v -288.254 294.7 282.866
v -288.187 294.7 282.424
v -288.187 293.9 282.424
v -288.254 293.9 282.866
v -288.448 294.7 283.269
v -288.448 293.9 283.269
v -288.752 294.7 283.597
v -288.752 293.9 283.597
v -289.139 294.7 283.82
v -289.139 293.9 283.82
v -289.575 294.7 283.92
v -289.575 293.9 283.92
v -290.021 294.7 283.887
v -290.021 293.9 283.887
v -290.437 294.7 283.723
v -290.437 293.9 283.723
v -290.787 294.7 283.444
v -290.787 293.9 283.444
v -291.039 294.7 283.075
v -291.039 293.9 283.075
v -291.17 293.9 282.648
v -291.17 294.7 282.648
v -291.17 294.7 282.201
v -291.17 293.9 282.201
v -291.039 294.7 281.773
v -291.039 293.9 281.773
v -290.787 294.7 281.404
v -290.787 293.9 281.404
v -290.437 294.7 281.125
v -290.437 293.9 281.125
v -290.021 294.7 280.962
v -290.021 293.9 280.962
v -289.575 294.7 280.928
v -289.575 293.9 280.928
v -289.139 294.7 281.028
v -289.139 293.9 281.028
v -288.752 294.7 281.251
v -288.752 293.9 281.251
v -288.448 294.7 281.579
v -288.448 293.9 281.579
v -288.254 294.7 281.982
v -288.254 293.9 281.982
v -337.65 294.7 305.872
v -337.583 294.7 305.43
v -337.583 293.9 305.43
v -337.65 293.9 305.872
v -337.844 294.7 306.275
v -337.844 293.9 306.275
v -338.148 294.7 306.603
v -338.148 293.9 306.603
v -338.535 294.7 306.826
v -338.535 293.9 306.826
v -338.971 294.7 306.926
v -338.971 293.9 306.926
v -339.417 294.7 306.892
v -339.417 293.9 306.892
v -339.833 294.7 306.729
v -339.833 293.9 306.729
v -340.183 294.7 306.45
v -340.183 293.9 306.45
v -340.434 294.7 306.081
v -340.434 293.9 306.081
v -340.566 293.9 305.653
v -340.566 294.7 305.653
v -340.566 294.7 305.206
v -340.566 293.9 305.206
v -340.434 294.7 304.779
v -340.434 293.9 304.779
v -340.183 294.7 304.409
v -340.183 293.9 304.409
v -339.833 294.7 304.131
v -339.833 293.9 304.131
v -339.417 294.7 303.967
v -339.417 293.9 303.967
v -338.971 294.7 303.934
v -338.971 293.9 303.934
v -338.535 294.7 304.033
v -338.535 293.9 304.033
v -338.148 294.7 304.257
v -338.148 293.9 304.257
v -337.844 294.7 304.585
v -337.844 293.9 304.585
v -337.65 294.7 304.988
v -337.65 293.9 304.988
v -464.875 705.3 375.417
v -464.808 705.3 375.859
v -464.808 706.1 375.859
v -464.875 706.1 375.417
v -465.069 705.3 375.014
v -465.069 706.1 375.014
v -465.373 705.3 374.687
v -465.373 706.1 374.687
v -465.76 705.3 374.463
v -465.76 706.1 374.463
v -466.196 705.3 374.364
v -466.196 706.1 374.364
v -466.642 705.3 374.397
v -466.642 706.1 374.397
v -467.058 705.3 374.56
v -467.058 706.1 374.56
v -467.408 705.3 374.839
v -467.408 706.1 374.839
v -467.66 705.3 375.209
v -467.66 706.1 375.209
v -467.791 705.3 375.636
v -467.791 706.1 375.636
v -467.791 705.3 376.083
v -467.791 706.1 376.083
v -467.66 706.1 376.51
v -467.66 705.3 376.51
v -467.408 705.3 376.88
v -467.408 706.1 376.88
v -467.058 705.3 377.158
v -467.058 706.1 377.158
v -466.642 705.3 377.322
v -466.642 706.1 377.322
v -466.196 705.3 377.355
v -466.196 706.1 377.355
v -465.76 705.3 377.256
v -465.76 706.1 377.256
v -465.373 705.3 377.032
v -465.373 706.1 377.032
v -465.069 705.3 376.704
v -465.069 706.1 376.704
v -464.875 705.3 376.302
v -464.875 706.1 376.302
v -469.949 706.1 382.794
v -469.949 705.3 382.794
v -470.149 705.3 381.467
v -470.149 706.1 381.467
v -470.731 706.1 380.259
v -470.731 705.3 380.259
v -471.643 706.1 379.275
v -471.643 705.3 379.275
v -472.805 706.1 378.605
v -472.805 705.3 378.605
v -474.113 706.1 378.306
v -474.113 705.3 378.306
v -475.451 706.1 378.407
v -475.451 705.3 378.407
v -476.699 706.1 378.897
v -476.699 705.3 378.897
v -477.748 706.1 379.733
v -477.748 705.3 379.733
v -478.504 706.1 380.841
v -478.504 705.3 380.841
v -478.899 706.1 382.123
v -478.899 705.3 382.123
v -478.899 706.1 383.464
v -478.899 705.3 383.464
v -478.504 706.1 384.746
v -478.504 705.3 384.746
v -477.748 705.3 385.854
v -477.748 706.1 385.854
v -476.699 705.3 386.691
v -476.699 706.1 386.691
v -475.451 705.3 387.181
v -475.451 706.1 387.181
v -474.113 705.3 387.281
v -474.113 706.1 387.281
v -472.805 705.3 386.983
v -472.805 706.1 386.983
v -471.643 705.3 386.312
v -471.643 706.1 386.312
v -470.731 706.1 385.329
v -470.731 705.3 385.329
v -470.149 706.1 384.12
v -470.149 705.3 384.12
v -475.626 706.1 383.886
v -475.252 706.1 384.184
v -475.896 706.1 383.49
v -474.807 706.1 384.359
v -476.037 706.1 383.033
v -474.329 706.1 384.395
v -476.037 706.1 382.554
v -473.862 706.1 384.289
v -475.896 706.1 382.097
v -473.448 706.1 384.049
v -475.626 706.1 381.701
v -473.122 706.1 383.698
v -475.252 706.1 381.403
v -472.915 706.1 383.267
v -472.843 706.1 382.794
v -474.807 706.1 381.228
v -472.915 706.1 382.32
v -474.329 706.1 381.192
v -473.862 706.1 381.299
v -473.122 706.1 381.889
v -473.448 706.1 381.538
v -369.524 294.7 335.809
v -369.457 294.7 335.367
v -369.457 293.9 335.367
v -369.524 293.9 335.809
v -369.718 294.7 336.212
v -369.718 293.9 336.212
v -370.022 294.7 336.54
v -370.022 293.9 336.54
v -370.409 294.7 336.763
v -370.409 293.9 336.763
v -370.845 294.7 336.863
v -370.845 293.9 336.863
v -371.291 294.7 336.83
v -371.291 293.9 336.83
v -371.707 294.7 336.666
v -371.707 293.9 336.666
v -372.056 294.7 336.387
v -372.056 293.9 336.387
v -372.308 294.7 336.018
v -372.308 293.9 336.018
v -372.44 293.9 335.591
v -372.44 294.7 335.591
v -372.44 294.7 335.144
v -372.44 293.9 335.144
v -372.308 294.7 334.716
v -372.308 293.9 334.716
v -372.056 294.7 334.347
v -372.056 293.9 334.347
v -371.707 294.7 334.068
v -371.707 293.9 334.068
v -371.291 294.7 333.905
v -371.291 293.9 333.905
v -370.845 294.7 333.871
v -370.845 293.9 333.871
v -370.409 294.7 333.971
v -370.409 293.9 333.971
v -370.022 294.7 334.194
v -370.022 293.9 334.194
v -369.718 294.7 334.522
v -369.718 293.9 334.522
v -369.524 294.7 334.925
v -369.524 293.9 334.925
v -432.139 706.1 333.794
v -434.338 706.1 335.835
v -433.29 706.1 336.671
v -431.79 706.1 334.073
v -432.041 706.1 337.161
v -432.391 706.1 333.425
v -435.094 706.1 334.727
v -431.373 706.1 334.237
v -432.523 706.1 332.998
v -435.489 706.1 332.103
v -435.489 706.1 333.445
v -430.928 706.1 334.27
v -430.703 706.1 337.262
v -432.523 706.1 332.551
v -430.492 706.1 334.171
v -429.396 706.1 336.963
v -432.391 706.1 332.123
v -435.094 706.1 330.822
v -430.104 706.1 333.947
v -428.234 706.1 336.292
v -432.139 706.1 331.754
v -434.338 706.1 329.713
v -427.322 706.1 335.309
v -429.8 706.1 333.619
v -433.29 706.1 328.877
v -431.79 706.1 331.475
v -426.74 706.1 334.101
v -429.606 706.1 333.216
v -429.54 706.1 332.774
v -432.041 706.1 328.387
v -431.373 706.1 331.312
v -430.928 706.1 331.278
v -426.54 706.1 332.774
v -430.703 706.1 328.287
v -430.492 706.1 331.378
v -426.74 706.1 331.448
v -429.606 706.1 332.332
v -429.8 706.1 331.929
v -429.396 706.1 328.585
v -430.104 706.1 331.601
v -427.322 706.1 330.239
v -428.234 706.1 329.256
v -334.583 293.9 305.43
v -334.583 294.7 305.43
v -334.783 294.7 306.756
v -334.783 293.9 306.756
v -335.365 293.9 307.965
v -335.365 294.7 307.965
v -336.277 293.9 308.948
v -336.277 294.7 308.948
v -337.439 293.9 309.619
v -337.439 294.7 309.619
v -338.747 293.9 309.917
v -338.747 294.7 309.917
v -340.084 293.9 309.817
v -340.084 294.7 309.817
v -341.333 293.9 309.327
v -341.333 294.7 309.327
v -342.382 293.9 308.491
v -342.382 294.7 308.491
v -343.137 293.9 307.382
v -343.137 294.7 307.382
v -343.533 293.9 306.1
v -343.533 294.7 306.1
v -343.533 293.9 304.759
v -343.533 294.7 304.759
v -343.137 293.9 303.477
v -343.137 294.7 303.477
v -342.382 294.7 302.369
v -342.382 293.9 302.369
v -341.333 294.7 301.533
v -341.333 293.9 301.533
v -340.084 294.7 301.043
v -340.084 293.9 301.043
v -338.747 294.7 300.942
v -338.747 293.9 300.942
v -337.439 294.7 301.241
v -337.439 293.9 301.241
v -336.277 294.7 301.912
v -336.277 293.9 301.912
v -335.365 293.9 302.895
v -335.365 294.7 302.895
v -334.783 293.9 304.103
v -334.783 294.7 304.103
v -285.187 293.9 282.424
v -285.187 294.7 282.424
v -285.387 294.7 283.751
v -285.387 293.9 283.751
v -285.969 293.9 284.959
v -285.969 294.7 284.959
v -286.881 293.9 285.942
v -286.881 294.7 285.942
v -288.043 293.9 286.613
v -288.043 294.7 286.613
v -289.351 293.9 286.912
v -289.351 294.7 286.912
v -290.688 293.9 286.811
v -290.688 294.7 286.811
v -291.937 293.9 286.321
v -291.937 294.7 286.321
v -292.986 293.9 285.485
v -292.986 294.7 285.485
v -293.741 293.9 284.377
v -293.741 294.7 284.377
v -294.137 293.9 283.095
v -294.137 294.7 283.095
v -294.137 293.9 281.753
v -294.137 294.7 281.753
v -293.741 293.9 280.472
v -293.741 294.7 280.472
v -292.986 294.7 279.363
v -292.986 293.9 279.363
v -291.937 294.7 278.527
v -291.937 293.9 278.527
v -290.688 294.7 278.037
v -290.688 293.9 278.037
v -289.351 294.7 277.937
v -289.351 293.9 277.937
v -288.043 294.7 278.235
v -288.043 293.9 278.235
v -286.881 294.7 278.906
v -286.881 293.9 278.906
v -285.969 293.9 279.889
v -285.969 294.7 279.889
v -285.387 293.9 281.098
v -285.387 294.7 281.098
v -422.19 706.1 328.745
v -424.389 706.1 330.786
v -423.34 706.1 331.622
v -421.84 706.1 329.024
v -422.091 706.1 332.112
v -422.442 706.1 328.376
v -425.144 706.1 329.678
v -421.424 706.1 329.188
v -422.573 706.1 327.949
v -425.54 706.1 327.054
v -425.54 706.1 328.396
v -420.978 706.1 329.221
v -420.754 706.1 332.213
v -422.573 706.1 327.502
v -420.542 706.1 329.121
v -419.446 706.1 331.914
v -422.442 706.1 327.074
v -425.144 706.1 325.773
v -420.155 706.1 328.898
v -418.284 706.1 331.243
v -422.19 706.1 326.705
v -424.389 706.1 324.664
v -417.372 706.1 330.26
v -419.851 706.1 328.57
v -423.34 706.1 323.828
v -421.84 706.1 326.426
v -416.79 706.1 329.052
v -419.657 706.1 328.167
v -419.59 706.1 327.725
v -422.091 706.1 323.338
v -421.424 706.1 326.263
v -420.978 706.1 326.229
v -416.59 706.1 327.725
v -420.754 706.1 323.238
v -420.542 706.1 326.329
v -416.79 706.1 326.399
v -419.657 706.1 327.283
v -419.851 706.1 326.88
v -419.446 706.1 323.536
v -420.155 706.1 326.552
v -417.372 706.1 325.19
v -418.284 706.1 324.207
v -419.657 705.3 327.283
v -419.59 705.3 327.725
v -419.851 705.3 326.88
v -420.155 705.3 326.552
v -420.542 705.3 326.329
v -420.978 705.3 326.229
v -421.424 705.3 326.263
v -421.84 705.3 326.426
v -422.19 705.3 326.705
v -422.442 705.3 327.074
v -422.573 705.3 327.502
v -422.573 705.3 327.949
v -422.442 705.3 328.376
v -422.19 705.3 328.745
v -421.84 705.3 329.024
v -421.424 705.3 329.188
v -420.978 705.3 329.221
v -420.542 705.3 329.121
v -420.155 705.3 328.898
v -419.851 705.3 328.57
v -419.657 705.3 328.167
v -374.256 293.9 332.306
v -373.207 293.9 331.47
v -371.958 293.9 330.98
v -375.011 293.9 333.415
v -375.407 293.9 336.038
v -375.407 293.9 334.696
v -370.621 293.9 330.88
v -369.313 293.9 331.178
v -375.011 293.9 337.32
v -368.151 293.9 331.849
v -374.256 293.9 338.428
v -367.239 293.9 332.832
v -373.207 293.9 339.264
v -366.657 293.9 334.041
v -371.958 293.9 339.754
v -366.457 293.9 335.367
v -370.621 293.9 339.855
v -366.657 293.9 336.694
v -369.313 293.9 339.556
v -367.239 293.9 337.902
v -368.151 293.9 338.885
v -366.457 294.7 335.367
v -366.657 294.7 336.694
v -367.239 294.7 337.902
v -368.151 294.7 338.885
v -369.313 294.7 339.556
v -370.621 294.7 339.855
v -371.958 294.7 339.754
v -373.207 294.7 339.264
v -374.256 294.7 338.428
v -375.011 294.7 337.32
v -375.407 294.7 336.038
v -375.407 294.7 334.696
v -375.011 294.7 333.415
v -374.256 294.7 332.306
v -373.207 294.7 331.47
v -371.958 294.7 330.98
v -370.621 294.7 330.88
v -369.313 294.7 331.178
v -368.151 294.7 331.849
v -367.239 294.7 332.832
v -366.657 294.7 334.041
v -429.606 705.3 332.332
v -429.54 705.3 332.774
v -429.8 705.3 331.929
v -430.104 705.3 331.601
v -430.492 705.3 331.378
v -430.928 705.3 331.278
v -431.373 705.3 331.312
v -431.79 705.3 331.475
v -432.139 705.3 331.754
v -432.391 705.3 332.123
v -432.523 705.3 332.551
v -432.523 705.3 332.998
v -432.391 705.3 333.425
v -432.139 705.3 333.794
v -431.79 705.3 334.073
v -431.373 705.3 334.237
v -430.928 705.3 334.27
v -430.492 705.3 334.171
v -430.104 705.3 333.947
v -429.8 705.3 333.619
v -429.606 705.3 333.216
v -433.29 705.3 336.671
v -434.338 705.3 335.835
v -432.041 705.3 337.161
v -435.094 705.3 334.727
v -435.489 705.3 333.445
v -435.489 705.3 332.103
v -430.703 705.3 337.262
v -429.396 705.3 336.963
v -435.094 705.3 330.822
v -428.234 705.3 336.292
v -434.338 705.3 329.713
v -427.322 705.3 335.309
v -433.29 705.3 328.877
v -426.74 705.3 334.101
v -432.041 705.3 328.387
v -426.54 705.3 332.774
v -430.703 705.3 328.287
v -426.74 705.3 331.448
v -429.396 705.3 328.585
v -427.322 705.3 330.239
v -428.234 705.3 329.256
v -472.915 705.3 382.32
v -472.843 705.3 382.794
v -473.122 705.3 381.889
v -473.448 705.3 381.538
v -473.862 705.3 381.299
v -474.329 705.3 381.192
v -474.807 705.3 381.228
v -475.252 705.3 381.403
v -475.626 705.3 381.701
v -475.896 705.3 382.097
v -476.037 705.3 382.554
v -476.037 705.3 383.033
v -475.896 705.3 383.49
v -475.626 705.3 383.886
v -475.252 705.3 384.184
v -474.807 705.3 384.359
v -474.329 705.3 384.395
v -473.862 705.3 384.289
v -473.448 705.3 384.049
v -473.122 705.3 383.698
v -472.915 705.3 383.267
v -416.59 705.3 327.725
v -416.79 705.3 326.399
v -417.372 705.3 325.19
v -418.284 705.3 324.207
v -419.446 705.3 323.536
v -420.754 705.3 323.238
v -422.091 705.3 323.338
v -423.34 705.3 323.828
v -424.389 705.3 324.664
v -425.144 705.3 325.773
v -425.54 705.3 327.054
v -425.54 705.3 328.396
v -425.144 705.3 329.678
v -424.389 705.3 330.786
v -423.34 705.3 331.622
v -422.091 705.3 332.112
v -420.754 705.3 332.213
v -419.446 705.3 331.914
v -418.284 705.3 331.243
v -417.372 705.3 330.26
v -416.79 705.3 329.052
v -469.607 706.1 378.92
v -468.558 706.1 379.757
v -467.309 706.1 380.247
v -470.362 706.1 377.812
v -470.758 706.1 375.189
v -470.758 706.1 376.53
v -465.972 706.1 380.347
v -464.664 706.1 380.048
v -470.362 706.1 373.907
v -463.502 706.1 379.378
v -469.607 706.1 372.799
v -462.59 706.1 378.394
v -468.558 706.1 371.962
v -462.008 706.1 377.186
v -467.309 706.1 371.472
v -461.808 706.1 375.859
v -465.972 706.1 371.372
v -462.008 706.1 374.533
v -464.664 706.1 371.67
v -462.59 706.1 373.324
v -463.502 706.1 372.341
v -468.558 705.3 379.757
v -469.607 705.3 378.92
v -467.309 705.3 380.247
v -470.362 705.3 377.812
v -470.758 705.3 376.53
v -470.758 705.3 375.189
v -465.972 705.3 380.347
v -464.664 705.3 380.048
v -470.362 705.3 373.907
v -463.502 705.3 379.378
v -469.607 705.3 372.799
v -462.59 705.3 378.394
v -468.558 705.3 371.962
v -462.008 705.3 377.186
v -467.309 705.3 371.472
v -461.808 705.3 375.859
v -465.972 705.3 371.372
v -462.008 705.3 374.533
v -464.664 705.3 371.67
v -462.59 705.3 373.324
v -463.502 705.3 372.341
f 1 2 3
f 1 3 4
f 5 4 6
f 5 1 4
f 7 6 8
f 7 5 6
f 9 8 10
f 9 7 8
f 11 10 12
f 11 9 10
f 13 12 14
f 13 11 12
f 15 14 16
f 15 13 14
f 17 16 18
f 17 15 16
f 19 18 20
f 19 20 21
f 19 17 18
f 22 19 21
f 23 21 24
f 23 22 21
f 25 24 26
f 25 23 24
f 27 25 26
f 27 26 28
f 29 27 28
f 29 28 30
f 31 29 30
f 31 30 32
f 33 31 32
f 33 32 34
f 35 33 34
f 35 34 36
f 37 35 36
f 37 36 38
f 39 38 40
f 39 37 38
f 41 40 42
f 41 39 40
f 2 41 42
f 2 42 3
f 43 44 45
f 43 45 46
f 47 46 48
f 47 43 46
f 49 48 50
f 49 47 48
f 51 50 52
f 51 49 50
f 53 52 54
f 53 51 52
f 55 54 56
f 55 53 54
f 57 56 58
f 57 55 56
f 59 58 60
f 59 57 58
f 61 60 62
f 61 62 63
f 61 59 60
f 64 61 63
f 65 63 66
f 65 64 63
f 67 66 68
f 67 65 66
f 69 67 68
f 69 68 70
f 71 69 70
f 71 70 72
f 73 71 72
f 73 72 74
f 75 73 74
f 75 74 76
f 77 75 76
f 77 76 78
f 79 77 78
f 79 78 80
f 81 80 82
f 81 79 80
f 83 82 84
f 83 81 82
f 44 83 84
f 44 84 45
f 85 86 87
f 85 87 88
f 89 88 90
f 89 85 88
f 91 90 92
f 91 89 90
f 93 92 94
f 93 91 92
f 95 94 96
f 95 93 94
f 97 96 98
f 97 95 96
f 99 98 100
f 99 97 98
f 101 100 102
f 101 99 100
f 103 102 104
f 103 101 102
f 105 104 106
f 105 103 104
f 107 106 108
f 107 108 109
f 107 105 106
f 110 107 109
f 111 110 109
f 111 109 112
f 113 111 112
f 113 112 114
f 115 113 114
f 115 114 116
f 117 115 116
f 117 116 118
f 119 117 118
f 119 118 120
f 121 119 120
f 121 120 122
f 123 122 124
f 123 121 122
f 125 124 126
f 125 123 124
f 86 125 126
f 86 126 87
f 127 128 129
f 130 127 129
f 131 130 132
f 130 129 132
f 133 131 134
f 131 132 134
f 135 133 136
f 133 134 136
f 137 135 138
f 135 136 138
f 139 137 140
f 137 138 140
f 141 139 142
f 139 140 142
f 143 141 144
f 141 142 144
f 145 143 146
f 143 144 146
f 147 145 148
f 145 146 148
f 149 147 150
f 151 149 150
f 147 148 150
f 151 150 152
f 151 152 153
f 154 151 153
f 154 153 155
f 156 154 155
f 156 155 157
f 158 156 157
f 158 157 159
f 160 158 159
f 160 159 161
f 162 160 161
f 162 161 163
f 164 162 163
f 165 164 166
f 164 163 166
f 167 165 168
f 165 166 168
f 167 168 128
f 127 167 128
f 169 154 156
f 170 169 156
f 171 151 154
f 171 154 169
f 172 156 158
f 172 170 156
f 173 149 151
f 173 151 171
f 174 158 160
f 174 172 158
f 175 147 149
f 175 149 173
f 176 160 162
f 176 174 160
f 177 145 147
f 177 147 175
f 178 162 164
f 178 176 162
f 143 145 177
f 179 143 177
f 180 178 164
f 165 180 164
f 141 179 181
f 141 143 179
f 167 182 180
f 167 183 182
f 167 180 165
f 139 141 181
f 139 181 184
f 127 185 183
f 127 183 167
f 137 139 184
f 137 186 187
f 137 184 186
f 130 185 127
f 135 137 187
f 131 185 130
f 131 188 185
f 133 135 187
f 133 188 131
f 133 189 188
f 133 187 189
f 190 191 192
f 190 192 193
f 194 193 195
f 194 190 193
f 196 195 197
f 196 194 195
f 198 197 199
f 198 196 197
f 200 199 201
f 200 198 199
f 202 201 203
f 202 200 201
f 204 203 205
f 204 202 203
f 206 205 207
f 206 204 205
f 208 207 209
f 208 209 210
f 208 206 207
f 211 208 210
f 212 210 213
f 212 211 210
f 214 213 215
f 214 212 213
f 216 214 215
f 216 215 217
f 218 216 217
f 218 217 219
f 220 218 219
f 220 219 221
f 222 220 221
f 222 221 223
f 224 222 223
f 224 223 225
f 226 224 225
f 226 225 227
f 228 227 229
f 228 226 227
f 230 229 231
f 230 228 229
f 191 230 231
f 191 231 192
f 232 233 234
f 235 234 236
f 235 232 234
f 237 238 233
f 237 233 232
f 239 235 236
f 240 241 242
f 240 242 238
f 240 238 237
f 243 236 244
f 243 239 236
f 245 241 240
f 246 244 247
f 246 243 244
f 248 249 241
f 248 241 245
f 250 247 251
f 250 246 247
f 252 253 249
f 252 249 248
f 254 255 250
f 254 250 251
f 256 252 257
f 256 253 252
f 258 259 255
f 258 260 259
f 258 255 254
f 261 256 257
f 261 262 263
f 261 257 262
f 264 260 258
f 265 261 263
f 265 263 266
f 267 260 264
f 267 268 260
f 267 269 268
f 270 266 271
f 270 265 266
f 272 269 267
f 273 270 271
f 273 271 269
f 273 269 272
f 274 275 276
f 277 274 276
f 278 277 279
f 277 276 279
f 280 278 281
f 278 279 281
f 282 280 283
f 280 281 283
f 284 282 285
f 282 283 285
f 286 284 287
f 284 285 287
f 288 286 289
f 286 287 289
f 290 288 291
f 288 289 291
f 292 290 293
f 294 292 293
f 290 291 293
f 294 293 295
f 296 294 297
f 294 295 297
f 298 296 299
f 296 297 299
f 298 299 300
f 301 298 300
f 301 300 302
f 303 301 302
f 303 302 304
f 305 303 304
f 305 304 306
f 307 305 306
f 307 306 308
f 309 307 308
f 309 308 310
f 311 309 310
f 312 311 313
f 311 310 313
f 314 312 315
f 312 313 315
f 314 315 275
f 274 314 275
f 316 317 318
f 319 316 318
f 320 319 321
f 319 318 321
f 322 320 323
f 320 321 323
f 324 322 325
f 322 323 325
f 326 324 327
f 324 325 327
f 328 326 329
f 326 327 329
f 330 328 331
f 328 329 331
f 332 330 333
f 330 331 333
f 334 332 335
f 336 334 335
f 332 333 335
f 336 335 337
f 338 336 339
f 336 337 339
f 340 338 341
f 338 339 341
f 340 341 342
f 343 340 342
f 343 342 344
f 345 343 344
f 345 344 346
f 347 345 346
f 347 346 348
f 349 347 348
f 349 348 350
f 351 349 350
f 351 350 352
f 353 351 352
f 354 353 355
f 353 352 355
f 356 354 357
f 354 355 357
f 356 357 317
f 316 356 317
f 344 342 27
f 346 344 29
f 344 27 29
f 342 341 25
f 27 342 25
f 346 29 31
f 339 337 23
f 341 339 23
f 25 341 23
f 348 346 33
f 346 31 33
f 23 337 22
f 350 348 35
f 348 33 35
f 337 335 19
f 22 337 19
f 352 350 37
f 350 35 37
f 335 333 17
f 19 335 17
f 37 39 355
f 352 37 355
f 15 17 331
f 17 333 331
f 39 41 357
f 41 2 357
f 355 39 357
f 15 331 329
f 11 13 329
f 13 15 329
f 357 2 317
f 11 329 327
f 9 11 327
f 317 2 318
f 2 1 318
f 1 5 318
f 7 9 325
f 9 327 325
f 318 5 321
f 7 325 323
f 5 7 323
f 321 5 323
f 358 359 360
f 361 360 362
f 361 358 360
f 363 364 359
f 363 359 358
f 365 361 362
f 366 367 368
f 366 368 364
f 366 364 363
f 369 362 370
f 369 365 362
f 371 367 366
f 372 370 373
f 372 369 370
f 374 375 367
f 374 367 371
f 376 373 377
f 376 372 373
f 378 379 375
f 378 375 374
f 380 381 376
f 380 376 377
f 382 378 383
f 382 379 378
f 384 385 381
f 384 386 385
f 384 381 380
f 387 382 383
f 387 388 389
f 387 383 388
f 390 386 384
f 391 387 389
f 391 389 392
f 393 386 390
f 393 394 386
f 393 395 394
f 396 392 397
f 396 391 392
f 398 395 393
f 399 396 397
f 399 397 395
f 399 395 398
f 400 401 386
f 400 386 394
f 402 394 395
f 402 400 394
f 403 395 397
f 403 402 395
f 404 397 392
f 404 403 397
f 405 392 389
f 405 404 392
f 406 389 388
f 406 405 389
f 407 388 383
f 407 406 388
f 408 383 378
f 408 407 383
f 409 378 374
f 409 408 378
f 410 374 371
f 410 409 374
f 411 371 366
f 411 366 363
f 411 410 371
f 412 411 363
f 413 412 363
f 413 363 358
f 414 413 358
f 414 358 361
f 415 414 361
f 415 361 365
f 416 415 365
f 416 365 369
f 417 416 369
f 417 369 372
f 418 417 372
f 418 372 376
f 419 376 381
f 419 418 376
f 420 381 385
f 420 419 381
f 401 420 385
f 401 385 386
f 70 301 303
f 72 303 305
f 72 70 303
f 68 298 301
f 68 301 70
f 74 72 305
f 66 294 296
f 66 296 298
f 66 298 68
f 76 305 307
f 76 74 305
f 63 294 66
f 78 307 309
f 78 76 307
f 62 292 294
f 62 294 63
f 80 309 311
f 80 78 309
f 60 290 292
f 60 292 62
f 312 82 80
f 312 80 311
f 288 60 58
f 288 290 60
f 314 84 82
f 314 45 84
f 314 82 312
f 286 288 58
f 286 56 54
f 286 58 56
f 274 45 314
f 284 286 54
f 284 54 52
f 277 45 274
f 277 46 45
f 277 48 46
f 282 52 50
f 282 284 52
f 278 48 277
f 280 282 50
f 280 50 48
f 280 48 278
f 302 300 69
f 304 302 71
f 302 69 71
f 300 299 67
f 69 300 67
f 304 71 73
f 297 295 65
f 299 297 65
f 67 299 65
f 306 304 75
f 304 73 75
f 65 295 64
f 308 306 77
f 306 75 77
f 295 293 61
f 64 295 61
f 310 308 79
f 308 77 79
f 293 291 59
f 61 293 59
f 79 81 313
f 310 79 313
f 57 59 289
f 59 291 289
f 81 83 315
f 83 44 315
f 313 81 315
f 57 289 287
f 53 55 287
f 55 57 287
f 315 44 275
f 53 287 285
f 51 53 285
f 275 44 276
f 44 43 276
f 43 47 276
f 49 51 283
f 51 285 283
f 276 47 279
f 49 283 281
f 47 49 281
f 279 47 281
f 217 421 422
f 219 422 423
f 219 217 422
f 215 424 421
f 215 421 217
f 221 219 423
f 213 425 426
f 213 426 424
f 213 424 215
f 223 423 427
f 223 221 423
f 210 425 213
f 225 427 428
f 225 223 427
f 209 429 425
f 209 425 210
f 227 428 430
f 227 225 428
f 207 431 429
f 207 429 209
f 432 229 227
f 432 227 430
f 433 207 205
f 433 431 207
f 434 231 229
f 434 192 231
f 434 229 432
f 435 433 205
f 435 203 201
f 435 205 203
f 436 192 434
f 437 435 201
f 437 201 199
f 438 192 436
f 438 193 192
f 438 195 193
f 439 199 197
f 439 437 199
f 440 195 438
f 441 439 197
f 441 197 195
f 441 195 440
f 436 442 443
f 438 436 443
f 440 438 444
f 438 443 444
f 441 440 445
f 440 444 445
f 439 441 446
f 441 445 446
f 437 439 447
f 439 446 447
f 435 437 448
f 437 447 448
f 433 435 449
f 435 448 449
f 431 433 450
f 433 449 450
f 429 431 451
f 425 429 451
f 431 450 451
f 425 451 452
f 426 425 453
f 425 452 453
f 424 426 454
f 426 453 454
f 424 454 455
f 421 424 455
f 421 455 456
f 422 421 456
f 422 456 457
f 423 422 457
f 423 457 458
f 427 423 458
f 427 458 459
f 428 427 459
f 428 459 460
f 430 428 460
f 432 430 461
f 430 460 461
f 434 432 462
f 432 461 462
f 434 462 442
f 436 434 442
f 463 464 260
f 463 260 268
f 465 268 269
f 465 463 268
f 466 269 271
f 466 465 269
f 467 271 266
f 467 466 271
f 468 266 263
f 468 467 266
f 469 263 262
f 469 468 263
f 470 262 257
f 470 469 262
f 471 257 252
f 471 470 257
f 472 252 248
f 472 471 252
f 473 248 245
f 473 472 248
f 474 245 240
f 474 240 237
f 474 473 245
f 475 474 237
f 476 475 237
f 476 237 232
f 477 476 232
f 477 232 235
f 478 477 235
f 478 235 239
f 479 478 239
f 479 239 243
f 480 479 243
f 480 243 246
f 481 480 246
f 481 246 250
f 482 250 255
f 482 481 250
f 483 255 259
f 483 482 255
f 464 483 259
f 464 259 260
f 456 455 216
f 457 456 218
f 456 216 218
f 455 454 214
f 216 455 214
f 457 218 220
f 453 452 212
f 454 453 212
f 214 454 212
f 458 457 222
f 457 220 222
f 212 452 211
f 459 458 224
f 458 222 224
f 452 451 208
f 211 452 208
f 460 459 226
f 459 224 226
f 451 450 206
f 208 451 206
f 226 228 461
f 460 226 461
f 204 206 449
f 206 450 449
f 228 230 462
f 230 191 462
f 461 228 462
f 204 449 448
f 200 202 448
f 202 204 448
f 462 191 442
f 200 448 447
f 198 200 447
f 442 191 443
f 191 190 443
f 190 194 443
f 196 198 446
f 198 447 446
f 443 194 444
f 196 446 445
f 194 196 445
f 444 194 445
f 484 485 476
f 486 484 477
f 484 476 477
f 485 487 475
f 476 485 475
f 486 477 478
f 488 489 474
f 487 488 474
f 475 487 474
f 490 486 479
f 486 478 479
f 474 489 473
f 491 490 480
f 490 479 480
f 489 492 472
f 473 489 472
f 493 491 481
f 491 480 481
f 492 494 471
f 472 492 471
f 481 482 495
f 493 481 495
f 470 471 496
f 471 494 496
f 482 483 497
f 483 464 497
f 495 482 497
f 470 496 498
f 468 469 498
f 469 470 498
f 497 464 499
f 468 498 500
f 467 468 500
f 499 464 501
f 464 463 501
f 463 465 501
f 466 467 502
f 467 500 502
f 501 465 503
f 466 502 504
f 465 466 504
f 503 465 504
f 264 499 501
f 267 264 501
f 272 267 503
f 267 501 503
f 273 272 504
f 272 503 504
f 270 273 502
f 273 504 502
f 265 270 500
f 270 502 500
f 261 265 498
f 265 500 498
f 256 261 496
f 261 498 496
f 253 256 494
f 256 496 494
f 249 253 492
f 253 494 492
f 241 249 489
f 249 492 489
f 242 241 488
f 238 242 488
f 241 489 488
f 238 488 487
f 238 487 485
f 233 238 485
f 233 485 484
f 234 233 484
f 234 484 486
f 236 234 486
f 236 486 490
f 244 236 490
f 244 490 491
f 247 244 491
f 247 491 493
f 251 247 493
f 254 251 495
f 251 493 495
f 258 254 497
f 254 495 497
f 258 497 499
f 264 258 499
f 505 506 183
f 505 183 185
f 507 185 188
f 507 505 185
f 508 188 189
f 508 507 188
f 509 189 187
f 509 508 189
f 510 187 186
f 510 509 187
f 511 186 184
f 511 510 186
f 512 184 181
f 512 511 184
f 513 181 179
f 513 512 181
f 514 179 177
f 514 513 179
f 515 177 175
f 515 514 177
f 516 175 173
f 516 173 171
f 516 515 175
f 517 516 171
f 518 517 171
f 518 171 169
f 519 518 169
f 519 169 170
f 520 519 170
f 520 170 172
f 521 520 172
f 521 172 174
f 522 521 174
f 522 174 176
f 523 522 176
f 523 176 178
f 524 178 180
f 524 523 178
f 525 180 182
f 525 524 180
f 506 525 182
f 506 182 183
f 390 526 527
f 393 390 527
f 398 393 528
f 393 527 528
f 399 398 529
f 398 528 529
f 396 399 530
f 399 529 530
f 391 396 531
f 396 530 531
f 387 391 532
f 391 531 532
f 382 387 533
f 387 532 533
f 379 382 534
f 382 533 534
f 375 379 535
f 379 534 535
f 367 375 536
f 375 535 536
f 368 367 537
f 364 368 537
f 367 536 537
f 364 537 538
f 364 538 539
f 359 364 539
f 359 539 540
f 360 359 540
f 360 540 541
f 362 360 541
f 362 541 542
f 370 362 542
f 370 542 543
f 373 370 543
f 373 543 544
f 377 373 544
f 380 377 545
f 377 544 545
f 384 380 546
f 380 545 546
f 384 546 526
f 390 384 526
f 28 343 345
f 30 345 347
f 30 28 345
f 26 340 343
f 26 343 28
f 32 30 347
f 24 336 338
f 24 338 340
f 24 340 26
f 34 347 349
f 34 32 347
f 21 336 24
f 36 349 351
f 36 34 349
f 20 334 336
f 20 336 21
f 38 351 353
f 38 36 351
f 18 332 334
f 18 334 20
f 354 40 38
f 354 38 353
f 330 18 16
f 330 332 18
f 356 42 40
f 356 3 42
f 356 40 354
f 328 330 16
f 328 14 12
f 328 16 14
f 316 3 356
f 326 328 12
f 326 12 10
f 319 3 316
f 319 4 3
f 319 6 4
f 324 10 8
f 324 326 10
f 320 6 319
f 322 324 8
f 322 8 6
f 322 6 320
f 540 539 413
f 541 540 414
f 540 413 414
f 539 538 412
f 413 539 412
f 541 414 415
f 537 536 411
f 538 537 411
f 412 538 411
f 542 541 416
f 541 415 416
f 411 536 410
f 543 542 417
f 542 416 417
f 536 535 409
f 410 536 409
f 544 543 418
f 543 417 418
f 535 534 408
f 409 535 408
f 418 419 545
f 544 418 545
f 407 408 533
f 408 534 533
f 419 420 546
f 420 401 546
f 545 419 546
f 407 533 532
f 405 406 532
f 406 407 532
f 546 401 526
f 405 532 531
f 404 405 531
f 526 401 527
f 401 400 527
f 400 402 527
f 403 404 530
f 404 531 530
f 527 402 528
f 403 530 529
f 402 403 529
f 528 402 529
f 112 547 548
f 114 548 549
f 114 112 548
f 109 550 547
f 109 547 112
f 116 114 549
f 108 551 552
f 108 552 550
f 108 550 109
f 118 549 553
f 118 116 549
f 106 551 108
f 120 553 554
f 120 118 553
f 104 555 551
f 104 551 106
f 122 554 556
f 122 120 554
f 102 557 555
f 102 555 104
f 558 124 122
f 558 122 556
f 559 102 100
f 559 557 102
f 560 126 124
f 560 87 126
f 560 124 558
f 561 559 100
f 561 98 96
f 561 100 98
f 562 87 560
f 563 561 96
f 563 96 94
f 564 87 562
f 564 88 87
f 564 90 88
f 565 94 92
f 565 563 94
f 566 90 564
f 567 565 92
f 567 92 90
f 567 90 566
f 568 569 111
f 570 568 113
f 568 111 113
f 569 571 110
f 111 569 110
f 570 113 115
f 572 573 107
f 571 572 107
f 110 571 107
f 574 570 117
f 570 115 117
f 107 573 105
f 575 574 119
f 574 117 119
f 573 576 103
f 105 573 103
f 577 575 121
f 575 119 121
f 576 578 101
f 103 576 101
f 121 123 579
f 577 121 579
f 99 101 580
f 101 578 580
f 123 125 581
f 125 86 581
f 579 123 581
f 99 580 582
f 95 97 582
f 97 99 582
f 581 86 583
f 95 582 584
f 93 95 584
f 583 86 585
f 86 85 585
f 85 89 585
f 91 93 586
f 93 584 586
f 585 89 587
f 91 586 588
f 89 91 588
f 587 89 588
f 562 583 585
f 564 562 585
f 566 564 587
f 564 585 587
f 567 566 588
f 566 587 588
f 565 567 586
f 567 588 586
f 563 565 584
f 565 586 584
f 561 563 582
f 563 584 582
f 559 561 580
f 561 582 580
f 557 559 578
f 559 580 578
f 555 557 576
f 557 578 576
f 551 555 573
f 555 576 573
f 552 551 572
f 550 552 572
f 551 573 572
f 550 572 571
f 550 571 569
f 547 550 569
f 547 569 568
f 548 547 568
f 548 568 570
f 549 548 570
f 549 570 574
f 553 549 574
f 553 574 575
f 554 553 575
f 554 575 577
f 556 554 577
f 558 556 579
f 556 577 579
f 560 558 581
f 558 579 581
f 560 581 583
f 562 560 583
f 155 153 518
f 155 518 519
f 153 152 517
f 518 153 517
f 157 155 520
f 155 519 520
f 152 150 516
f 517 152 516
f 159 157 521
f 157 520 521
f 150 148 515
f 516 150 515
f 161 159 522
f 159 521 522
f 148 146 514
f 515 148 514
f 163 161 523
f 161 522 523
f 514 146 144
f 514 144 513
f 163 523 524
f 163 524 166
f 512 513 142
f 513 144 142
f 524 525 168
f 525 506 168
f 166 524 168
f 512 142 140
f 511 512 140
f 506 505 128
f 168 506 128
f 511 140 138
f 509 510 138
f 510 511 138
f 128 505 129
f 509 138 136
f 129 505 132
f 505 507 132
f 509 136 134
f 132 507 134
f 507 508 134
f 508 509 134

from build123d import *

# Parameters (mm, degrees)
SZKIC1_R                      = 4.5
SZKIC1_R_2                    = 1.5
DODANIE_WYCI_GNI_CIE1_DEPTH   = 0.8
DODANIE_WYCI_GNI_CIE1_2_DEPTH = 0.8
DODANIE_WYCI_GNI_CIE1_3_DEPTH = 0.8
SZKIC1_R_3                    = 1.605914525
DODANIE_WYCI_GNI_CIE1_4_DEPTH = 0.8
SZKIC2_R                      = 4.5
SZKIC2_R_2                    = 1.5
DODANIE_WYCI_GNI_CIE2_DEPTH   = 0.8
DODANIE_WYCI_GNI_CIE2_2_DEPTH = 0.8
DODANIE_WYCI_GNI_CIE2_3_DEPTH = 0.8


with BuildPart() as part:
    # Szkic1 → Dodanie-wyciągnięcie1 (new body)
    with BuildSketch(Plane(origin=(0, 705.3, 0), x_dir=(1, 0, 0), z_dir=(0, 1, 0))):
        with Locations((-421.090050281, -327.725114352)):
            Circle(SZKIC1_R)
        with Locations((-421.090050281, -327.725114352)):
            Circle(SZKIC1_R_2, mode=Mode.SUBTRACT)
    extrude(amount=DODANIE_WYCI_GNI_CIE1_DEPTH)


with BuildPart() as body_2:
    # Szkic1 → Dodanie-wyci_gni_cie1 2 (new body)
    with BuildSketch(Plane(origin=(0, 705.3, 0), x_dir=(1, 0, 0), z_dir=(0, 1, 0))):
        with Locations((-431.039698402, -332.774189517)):
            Circle(SZKIC1_R)
        with Locations((-431.039698402, -332.774189517)):
            Circle(SZKIC1_R_2, mode=Mode.SUBTRACT)
    extrude(amount=DODANIE_WYCI_GNI_CIE1_2_DEPTH)


with BuildPart() as body_3:
    # Szkic1 → Dodanie-wyci_gni_cie1 3 (new body)
    with BuildSketch(Plane(origin=(0, 705.3, 0), x_dir=(1, 0, 0), z_dir=(0, 1, 0))):
        with Locations((-466.308050674, -375.85941501)):
            Circle(SZKIC1_R)
        with Locations((-466.308050674, -375.85941501)):
            Circle(SZKIC1_R_2, mode=Mode.SUBTRACT)
    extrude(amount=DODANIE_WYCI_GNI_CIE1_3_DEPTH)


with BuildPart() as body_4:
    # Szkic1 → Dodanie-wyci_gni_cie1 4 (new body)
    with BuildSketch(Plane(origin=(0, 705.3, 0), x_dir=(1, 0, 0), z_dir=(0, 1, 0))):
        with Locations((-474.449169572, -382.793687092)):
            Circle(SZKIC1_R)
        with Locations((-474.449169572, -382.793687092)):
            Circle(SZKIC1_R_3, mode=Mode.SUBTRACT)
    extrude(amount=DODANIE_WYCI_GNI_CIE1_4_DEPTH)


with BuildPart() as body_5:
    # Szkic2 → Dodanie-wyciągnięcie2 (new body)
    with BuildSketch(Plane.XZ.offset(-294.7)):
        with Locations((-370.956911026, 335.367132453)):
            Circle(SZKIC2_R)
        with Locations((-370.956911026, 335.367132453)):
            Circle(SZKIC2_R_2, mode=Mode.SUBTRACT)
    extrude(amount=DODANIE_WYCI_GNI_CIE2_DEPTH)


with BuildPart() as body_6:
    # Szkic2 → Dodanie-wyci_gni_cie2 2 (new body)
    with BuildSketch(Plane.XZ.offset(-294.7)):
        with Locations((-339.082998521, 305.429754445)):
            Circle(SZKIC2_R)
        with Locations((-339.082998521, 305.429754445)):
            Circle(SZKIC2_R_2, mode=Mode.SUBTRACT)
    extrude(amount=DODANIE_WYCI_GNI_CIE2_2_DEPTH)


with BuildPart() as body_7:
    # Szkic2 → Dodanie-wyci_gni_cie2 3 (new body)
    with BuildSketch(Plane.XZ.offset(-294.7)):
        with Locations((-289.68705591, 282.424125213)):
            Circle(SZKIC2_R)
        with Locations((-289.68705591, 282.424125213)):
            Circle(SZKIC2_R_2, mode=Mode.SUBTRACT)
    extrude(amount=DODANIE_WYCI_GNI_CIE2_3_DEPTH)


solid = Compound([part.part, body_2.part, body_3.part, body_4.part, body_5.part, body_6.part, body_7.part])
